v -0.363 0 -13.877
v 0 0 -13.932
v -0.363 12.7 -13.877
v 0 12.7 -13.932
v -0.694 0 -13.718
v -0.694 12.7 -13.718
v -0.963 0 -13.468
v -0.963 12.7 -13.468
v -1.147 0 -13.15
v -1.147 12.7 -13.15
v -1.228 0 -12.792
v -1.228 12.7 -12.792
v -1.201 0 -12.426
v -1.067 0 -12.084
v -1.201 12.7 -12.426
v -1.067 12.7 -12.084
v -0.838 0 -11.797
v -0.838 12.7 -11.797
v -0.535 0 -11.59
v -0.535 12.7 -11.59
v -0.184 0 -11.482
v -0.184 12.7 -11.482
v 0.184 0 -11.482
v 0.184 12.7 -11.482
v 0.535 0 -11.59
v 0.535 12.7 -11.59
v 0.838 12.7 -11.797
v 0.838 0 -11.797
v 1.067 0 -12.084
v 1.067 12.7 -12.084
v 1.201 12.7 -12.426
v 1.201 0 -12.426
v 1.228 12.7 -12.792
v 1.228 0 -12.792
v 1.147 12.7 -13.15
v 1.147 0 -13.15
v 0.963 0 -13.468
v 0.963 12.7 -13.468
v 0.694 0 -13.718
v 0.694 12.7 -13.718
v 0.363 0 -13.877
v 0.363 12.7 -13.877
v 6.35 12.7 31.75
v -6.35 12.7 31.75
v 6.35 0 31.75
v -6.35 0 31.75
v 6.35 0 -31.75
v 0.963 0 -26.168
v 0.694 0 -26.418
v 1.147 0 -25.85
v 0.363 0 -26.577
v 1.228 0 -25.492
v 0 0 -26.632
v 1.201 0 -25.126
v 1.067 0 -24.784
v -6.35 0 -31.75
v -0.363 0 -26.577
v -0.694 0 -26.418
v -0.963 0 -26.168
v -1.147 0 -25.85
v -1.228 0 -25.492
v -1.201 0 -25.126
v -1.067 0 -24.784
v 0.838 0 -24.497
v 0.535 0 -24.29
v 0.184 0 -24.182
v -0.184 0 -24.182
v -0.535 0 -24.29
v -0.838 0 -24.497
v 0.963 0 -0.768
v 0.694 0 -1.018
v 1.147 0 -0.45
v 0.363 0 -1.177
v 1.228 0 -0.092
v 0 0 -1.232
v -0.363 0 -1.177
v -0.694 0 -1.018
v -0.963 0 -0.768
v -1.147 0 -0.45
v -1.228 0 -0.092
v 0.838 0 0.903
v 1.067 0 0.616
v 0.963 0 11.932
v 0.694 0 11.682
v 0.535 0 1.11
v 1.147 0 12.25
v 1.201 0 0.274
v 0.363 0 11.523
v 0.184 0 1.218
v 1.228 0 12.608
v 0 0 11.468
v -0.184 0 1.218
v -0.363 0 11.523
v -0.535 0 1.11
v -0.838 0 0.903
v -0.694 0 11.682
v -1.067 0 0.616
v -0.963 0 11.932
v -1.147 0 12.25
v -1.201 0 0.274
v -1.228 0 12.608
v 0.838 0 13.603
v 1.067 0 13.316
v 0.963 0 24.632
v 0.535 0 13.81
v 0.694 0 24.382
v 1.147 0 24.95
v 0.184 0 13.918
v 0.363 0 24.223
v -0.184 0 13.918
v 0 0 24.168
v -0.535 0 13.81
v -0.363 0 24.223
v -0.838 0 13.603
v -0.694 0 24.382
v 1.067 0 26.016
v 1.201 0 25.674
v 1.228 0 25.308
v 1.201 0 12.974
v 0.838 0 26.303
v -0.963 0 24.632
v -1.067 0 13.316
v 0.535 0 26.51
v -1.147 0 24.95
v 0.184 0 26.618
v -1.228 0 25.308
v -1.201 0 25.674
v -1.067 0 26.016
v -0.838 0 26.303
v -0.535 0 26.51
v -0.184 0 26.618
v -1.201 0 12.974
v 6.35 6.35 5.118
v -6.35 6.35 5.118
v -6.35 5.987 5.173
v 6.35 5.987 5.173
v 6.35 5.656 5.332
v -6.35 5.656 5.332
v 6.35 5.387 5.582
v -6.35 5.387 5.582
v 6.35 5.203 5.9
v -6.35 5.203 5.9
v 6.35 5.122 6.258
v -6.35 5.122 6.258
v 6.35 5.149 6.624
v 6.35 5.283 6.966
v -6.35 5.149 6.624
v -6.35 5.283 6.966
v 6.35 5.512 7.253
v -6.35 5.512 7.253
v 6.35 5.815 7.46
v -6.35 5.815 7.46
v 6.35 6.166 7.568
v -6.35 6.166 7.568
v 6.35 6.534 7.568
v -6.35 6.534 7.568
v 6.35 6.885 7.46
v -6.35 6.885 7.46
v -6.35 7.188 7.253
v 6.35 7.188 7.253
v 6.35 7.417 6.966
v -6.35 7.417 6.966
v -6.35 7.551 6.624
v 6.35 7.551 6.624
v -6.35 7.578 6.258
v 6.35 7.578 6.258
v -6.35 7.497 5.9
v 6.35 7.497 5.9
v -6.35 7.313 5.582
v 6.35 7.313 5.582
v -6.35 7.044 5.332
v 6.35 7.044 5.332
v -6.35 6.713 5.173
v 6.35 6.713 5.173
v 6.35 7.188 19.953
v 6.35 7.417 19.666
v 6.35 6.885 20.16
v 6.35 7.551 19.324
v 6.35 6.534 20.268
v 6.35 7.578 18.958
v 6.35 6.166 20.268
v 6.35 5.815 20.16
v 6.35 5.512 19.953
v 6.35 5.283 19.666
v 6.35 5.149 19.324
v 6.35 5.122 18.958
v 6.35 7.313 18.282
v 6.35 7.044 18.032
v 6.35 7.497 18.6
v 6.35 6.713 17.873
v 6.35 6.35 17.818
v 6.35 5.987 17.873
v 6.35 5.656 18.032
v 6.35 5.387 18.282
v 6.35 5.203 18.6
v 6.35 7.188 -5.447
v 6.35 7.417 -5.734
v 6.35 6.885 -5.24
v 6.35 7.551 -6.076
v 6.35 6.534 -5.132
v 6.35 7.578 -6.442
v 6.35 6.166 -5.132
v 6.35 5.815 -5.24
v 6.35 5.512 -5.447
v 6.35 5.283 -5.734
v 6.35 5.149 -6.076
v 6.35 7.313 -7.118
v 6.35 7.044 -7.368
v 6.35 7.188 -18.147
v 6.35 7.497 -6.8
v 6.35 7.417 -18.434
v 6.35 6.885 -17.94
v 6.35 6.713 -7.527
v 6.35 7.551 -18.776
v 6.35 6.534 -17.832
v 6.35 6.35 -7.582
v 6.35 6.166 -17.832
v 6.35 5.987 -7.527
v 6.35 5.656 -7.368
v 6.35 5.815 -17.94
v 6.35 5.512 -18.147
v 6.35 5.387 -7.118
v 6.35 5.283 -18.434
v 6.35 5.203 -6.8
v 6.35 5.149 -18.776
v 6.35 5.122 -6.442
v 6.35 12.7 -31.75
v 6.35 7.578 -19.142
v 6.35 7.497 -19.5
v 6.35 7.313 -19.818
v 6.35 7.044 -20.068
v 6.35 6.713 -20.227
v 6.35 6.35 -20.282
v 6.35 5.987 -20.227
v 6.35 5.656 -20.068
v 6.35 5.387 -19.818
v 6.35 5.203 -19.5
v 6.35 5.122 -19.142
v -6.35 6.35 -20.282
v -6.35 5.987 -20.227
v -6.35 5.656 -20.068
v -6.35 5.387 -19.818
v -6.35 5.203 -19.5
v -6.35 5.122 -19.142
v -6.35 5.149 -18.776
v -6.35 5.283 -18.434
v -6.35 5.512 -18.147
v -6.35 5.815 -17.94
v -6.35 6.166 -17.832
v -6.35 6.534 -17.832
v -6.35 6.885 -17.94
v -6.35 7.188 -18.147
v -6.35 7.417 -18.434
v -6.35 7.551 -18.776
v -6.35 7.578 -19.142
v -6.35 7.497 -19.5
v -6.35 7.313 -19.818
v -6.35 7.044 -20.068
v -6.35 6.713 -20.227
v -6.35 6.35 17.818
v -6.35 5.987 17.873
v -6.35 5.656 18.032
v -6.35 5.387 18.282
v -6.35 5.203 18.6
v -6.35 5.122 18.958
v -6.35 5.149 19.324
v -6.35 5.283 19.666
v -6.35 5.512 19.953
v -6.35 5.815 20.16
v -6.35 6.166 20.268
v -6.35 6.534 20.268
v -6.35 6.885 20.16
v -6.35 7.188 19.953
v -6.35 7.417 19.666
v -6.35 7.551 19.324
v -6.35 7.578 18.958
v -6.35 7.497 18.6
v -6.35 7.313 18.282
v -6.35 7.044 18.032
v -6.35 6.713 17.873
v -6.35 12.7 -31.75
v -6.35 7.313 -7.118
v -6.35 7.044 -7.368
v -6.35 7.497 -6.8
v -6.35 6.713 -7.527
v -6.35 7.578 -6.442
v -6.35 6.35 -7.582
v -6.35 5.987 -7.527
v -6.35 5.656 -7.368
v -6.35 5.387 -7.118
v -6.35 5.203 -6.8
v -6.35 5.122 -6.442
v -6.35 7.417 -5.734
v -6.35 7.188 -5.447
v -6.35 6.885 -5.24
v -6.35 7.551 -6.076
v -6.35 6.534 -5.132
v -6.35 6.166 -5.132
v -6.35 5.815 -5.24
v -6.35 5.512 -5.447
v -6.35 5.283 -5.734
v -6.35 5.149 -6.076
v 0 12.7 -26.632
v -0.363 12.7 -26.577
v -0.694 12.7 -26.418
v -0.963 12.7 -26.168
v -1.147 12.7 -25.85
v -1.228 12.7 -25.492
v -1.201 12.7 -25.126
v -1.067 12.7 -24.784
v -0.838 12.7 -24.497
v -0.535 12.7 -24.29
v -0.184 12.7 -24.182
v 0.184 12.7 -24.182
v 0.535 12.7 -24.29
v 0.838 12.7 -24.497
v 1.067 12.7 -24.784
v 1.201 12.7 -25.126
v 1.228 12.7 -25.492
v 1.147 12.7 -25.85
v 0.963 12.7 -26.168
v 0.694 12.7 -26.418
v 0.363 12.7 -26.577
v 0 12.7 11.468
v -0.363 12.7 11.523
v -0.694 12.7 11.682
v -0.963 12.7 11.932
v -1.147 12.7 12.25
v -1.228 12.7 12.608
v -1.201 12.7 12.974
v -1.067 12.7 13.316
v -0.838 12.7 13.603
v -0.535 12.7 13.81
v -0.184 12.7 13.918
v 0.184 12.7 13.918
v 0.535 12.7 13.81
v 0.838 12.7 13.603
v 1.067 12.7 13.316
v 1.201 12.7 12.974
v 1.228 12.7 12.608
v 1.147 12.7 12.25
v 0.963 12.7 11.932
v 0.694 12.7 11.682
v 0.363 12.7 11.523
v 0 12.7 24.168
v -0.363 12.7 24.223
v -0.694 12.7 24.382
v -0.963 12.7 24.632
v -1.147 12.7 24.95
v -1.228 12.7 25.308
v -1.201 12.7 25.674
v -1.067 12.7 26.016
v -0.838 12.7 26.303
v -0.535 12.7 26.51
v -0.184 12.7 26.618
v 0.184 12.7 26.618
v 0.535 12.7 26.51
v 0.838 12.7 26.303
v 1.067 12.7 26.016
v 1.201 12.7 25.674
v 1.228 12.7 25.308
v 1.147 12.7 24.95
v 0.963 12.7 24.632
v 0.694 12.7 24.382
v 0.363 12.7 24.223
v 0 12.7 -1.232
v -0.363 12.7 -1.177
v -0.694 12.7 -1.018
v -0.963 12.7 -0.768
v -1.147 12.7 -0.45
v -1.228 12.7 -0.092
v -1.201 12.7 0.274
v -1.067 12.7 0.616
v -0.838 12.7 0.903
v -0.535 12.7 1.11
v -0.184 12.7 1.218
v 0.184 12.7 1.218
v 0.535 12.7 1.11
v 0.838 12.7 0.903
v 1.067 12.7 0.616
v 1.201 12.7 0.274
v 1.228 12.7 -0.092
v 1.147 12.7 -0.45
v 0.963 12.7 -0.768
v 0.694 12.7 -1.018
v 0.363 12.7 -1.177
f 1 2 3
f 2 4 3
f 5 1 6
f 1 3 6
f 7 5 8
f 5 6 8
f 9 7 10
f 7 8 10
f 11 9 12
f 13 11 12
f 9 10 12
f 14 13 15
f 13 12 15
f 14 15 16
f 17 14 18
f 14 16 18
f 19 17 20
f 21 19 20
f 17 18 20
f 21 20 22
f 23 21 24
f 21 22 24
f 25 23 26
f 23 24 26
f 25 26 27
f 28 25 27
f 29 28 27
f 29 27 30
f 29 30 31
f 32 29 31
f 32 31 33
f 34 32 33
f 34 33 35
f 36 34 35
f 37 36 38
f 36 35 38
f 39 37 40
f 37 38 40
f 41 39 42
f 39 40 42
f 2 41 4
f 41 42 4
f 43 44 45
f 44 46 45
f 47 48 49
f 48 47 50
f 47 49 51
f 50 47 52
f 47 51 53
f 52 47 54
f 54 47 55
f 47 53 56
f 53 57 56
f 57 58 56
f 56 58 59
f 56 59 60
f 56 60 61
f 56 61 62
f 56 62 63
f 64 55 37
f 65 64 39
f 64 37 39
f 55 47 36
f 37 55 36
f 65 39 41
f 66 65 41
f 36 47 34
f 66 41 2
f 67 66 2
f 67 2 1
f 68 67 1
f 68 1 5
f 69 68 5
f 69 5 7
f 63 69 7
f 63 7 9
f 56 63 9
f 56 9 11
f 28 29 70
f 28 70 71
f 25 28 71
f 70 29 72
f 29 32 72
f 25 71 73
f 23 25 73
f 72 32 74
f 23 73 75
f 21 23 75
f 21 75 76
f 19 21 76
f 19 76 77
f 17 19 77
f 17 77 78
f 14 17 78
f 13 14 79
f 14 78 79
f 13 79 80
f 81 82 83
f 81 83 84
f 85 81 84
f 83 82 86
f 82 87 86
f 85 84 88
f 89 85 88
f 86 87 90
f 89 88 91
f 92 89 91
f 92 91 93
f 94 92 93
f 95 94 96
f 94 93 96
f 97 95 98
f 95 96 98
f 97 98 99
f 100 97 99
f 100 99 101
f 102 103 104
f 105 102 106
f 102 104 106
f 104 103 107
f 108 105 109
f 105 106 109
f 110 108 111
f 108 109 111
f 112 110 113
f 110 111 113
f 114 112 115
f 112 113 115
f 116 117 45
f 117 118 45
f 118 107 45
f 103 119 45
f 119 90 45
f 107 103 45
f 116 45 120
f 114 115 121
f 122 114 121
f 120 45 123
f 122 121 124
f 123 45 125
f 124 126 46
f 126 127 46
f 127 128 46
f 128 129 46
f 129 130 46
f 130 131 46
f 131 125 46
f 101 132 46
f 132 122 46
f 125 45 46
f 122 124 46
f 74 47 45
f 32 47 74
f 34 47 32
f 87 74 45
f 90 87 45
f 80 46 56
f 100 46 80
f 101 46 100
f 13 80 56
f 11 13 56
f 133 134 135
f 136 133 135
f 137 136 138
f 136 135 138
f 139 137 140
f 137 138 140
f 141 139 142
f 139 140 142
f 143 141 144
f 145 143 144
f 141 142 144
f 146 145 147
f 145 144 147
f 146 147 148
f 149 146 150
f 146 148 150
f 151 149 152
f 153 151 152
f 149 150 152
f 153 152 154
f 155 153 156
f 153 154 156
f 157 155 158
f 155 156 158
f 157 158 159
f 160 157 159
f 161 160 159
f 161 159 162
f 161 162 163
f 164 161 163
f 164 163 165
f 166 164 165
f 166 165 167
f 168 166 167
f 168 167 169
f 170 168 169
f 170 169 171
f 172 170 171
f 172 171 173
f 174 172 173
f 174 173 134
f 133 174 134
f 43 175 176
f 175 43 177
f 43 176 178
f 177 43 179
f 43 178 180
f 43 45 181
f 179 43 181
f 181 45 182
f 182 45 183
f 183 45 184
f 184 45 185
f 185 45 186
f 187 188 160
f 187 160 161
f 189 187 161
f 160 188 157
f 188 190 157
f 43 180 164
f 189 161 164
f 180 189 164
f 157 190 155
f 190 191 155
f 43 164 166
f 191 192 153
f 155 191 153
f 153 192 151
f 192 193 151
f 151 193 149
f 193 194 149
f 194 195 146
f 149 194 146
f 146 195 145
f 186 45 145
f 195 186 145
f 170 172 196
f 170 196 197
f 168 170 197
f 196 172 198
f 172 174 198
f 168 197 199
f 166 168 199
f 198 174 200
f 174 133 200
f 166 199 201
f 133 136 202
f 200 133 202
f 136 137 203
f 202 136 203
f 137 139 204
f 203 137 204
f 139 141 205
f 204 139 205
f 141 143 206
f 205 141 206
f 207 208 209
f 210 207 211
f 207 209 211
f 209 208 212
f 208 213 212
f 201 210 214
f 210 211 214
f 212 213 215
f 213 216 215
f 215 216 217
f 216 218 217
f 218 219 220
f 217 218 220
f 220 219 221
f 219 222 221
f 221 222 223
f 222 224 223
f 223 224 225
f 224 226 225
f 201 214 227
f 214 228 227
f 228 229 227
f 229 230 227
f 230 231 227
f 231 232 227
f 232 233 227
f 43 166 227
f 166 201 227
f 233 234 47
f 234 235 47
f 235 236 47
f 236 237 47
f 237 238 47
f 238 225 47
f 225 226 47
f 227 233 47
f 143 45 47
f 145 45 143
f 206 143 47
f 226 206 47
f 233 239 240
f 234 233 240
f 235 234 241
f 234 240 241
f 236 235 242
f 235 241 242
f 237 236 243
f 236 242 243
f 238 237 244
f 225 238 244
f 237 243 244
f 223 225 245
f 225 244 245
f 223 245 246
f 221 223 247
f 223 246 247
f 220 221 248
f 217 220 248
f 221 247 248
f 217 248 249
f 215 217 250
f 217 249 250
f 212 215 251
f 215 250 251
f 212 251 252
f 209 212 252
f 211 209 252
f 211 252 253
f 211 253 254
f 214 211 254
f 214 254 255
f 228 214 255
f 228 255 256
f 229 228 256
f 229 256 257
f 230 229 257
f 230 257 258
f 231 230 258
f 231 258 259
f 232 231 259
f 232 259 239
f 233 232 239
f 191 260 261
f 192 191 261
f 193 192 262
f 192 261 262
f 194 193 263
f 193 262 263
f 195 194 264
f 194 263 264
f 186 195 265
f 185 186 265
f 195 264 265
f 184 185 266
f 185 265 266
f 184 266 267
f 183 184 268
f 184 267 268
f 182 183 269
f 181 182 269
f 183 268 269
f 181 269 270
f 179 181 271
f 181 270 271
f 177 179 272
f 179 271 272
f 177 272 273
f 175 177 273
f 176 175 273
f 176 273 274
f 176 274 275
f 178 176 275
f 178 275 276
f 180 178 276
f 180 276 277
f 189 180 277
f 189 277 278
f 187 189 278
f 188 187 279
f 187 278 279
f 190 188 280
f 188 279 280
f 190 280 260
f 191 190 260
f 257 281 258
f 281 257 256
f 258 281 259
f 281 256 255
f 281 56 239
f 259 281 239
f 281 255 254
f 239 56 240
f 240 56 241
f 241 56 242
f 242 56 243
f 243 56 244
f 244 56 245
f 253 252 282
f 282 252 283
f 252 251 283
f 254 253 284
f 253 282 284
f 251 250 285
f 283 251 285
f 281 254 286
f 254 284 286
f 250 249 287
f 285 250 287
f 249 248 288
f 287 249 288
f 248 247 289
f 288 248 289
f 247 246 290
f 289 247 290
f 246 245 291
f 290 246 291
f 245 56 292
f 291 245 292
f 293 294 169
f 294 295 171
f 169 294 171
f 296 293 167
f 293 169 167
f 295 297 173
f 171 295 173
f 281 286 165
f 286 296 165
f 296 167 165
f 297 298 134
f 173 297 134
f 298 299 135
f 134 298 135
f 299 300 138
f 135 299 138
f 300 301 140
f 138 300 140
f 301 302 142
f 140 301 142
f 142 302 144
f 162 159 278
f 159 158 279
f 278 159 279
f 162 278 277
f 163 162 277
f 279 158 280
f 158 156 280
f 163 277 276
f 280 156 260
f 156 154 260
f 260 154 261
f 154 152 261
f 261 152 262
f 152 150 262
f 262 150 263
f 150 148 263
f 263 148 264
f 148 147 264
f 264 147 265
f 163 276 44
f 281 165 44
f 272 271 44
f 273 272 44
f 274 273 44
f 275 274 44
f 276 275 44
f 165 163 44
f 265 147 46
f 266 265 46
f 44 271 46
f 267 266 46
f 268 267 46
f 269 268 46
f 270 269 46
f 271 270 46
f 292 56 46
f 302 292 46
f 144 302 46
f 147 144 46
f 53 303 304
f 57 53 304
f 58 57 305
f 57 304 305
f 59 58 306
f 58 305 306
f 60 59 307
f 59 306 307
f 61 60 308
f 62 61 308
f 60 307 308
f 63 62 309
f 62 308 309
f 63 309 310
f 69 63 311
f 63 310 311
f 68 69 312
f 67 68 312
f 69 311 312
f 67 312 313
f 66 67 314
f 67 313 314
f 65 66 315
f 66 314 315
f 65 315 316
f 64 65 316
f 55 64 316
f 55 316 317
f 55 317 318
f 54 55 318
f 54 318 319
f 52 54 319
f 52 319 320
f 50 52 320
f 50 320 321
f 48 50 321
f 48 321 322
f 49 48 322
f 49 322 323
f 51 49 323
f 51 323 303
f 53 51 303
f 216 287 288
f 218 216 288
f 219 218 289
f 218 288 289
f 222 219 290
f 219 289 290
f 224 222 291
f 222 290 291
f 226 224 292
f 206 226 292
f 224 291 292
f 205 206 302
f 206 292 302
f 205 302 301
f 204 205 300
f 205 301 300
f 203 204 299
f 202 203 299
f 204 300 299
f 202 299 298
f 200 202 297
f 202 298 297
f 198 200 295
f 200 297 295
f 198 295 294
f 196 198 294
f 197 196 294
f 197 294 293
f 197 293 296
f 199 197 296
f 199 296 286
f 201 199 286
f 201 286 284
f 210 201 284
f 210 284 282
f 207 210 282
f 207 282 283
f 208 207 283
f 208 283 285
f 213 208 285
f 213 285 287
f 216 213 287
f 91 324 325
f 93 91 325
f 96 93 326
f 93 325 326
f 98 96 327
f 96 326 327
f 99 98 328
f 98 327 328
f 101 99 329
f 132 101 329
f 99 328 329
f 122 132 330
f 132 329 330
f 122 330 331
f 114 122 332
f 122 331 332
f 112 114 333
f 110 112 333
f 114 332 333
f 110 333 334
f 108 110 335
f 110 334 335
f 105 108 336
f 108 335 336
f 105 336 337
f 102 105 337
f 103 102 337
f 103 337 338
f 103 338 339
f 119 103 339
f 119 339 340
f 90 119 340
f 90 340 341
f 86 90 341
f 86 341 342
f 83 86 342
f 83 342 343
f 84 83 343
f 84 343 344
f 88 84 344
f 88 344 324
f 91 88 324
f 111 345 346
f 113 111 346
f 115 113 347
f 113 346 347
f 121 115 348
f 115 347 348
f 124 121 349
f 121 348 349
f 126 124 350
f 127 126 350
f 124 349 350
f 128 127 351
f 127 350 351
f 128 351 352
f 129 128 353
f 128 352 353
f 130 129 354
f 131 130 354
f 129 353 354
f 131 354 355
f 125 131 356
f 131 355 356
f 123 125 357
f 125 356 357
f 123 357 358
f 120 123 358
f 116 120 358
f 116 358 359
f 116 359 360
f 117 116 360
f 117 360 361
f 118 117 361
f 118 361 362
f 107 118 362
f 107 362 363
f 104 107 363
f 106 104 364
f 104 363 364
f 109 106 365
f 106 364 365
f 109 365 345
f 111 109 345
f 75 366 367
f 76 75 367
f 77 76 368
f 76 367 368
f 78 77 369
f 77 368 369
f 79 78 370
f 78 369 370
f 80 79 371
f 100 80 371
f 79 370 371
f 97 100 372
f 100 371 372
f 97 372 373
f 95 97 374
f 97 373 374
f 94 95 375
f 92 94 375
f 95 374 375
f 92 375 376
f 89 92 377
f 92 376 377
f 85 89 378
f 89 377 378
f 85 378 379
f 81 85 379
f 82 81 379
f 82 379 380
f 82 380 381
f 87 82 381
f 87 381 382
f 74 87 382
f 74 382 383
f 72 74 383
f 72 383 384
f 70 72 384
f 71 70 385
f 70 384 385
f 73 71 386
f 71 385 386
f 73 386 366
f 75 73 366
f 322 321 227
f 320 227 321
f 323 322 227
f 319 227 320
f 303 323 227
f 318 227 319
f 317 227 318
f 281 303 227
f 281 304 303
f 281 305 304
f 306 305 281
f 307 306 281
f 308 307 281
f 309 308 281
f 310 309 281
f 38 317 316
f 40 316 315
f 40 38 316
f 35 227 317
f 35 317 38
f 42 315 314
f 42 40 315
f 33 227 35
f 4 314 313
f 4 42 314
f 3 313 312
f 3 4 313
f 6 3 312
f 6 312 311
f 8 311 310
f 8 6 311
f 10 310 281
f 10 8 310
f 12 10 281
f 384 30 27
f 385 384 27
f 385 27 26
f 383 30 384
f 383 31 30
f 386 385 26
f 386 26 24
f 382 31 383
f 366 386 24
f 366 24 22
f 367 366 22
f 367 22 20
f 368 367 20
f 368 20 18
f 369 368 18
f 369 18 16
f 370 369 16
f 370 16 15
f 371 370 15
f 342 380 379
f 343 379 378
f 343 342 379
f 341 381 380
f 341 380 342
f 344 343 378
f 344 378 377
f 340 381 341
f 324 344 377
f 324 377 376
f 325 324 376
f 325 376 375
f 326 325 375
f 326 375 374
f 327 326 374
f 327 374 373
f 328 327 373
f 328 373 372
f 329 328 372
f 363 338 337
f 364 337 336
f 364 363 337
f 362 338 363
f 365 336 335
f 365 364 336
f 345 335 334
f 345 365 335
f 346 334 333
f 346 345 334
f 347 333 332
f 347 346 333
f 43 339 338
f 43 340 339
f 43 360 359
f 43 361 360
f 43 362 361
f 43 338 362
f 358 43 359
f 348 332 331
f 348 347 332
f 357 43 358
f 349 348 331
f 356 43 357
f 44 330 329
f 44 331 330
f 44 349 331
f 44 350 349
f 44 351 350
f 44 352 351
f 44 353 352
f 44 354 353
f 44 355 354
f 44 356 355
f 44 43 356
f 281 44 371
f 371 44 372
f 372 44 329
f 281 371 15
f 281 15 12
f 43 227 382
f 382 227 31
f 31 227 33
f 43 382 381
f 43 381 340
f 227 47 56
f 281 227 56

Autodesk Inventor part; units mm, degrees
ref_plane "YZ Plane" through (0, 0, 0) normal (1, 0, 0) x (0, 1, 0)
ref_plane "XZ Plane" through (0, 0, 0) normal (0, 1, 0) x (-1, 0, 0)
ref_plane "XY Plane" through (0, 0, 0) normal (0, 0, 1) x (1, 0, 0)
sketch "Sketch1" plane through (0, 0, 0) normal (0, 1, 0) x (-1, 0, 0)
  line L0 (-6.35, -31.75) -> (6.35, -31.75)
  line L1 (6.35, -31.75) -> (6.35, 31.75)
  line L2 (6.35, 31.75) -> (-6.35, 31.75)
  line L3 (-6.35, 31.75) -> (-6.35, -31.75)
  line L4 (-6.35, -31.75) -> (6.35, 31.75) construction
  line L5 (6.35, -31.75) -> (-6.35, 31.75) construction
  point P0 (0, 0)
  dimension "d0" = 63.5
  dimension "d1" = 12.7
extrude "Extrusion1" add sketch "Sketch1" along normal blind 12.7
sketch "Sketch2" plane through (6.35, 0, 31.75) normal (1, 0, 0) x (0, 0, -1)
  line L0 (63.5, 0) -> (63.5, 12.7) projected
  line L1 (63.5, 6.35) -> (0, 6.35)
  line L2 (0, 0) -> (0, 12.7) projected
  line L3 (31.75, 6.35) -> (31.75, 12.7)
  point P0 (31.75, 0)
  point P1 (12.7, 6.35)
  point P2 (25.4, 6.35)
  point P3 (38.1, 6.35)
  point P4 (50.8, 6.35)
  dimension "d4" = 12.7
  dimension "d5" = 12.7
  dimension "d6" = 12.7
  dimension "d15" = 6.35
hole "Hole1" at (6.35, 6.35, 19.05) at (6.35, 6.35, 6.35) at (6.35, 6.35, -6.35) at (6.35, 6.35, -19.05) direction (-1, 0, 0) diameter 2.4638 end through all
sketch "Sketch3" plane through (0, 0, 0) normal (0, -1, 0) x (1, 0, 0)
  line L0 (6.35, 31.75) -> (6.35, -31.75) projected
  line L1 (6.35, 0) -> (-6.35, 0)
  line L2 (-6.35, -31.75) -> (-6.35, 31.75) projected
  point P0 (0, 0)
  point P1 (0, 25.4)
  point P2 (0, 12.7)
  point P3 (0, -12.7)
  point P4 (0, -25.4)
  point P5 (0, 0)
  dimension "d16" = 12.7
  dimension "d17" = 12.7
  dimension "d18" = 12.7
  dimension "d19" = 12.7
hole "Hole2" at (0, 0, 25.4) at (0, 0, 12.7) at (0, 0, -12.7) at (0, 0, -25.4) at (0, 0, 0) direction (0, 1, 0) diameter 2.4638 end through all
equation "\"d5\" = d4"
equation "\"d6\" = d5"
equation "\"d15\" = 0.5 * d5"
equation "\"d17\" = d16"
equation "\"d18\" = d17"
equation "\"d19\" = d18"
properties part number "Lead_Screw_Fixture_Side_Wall"
